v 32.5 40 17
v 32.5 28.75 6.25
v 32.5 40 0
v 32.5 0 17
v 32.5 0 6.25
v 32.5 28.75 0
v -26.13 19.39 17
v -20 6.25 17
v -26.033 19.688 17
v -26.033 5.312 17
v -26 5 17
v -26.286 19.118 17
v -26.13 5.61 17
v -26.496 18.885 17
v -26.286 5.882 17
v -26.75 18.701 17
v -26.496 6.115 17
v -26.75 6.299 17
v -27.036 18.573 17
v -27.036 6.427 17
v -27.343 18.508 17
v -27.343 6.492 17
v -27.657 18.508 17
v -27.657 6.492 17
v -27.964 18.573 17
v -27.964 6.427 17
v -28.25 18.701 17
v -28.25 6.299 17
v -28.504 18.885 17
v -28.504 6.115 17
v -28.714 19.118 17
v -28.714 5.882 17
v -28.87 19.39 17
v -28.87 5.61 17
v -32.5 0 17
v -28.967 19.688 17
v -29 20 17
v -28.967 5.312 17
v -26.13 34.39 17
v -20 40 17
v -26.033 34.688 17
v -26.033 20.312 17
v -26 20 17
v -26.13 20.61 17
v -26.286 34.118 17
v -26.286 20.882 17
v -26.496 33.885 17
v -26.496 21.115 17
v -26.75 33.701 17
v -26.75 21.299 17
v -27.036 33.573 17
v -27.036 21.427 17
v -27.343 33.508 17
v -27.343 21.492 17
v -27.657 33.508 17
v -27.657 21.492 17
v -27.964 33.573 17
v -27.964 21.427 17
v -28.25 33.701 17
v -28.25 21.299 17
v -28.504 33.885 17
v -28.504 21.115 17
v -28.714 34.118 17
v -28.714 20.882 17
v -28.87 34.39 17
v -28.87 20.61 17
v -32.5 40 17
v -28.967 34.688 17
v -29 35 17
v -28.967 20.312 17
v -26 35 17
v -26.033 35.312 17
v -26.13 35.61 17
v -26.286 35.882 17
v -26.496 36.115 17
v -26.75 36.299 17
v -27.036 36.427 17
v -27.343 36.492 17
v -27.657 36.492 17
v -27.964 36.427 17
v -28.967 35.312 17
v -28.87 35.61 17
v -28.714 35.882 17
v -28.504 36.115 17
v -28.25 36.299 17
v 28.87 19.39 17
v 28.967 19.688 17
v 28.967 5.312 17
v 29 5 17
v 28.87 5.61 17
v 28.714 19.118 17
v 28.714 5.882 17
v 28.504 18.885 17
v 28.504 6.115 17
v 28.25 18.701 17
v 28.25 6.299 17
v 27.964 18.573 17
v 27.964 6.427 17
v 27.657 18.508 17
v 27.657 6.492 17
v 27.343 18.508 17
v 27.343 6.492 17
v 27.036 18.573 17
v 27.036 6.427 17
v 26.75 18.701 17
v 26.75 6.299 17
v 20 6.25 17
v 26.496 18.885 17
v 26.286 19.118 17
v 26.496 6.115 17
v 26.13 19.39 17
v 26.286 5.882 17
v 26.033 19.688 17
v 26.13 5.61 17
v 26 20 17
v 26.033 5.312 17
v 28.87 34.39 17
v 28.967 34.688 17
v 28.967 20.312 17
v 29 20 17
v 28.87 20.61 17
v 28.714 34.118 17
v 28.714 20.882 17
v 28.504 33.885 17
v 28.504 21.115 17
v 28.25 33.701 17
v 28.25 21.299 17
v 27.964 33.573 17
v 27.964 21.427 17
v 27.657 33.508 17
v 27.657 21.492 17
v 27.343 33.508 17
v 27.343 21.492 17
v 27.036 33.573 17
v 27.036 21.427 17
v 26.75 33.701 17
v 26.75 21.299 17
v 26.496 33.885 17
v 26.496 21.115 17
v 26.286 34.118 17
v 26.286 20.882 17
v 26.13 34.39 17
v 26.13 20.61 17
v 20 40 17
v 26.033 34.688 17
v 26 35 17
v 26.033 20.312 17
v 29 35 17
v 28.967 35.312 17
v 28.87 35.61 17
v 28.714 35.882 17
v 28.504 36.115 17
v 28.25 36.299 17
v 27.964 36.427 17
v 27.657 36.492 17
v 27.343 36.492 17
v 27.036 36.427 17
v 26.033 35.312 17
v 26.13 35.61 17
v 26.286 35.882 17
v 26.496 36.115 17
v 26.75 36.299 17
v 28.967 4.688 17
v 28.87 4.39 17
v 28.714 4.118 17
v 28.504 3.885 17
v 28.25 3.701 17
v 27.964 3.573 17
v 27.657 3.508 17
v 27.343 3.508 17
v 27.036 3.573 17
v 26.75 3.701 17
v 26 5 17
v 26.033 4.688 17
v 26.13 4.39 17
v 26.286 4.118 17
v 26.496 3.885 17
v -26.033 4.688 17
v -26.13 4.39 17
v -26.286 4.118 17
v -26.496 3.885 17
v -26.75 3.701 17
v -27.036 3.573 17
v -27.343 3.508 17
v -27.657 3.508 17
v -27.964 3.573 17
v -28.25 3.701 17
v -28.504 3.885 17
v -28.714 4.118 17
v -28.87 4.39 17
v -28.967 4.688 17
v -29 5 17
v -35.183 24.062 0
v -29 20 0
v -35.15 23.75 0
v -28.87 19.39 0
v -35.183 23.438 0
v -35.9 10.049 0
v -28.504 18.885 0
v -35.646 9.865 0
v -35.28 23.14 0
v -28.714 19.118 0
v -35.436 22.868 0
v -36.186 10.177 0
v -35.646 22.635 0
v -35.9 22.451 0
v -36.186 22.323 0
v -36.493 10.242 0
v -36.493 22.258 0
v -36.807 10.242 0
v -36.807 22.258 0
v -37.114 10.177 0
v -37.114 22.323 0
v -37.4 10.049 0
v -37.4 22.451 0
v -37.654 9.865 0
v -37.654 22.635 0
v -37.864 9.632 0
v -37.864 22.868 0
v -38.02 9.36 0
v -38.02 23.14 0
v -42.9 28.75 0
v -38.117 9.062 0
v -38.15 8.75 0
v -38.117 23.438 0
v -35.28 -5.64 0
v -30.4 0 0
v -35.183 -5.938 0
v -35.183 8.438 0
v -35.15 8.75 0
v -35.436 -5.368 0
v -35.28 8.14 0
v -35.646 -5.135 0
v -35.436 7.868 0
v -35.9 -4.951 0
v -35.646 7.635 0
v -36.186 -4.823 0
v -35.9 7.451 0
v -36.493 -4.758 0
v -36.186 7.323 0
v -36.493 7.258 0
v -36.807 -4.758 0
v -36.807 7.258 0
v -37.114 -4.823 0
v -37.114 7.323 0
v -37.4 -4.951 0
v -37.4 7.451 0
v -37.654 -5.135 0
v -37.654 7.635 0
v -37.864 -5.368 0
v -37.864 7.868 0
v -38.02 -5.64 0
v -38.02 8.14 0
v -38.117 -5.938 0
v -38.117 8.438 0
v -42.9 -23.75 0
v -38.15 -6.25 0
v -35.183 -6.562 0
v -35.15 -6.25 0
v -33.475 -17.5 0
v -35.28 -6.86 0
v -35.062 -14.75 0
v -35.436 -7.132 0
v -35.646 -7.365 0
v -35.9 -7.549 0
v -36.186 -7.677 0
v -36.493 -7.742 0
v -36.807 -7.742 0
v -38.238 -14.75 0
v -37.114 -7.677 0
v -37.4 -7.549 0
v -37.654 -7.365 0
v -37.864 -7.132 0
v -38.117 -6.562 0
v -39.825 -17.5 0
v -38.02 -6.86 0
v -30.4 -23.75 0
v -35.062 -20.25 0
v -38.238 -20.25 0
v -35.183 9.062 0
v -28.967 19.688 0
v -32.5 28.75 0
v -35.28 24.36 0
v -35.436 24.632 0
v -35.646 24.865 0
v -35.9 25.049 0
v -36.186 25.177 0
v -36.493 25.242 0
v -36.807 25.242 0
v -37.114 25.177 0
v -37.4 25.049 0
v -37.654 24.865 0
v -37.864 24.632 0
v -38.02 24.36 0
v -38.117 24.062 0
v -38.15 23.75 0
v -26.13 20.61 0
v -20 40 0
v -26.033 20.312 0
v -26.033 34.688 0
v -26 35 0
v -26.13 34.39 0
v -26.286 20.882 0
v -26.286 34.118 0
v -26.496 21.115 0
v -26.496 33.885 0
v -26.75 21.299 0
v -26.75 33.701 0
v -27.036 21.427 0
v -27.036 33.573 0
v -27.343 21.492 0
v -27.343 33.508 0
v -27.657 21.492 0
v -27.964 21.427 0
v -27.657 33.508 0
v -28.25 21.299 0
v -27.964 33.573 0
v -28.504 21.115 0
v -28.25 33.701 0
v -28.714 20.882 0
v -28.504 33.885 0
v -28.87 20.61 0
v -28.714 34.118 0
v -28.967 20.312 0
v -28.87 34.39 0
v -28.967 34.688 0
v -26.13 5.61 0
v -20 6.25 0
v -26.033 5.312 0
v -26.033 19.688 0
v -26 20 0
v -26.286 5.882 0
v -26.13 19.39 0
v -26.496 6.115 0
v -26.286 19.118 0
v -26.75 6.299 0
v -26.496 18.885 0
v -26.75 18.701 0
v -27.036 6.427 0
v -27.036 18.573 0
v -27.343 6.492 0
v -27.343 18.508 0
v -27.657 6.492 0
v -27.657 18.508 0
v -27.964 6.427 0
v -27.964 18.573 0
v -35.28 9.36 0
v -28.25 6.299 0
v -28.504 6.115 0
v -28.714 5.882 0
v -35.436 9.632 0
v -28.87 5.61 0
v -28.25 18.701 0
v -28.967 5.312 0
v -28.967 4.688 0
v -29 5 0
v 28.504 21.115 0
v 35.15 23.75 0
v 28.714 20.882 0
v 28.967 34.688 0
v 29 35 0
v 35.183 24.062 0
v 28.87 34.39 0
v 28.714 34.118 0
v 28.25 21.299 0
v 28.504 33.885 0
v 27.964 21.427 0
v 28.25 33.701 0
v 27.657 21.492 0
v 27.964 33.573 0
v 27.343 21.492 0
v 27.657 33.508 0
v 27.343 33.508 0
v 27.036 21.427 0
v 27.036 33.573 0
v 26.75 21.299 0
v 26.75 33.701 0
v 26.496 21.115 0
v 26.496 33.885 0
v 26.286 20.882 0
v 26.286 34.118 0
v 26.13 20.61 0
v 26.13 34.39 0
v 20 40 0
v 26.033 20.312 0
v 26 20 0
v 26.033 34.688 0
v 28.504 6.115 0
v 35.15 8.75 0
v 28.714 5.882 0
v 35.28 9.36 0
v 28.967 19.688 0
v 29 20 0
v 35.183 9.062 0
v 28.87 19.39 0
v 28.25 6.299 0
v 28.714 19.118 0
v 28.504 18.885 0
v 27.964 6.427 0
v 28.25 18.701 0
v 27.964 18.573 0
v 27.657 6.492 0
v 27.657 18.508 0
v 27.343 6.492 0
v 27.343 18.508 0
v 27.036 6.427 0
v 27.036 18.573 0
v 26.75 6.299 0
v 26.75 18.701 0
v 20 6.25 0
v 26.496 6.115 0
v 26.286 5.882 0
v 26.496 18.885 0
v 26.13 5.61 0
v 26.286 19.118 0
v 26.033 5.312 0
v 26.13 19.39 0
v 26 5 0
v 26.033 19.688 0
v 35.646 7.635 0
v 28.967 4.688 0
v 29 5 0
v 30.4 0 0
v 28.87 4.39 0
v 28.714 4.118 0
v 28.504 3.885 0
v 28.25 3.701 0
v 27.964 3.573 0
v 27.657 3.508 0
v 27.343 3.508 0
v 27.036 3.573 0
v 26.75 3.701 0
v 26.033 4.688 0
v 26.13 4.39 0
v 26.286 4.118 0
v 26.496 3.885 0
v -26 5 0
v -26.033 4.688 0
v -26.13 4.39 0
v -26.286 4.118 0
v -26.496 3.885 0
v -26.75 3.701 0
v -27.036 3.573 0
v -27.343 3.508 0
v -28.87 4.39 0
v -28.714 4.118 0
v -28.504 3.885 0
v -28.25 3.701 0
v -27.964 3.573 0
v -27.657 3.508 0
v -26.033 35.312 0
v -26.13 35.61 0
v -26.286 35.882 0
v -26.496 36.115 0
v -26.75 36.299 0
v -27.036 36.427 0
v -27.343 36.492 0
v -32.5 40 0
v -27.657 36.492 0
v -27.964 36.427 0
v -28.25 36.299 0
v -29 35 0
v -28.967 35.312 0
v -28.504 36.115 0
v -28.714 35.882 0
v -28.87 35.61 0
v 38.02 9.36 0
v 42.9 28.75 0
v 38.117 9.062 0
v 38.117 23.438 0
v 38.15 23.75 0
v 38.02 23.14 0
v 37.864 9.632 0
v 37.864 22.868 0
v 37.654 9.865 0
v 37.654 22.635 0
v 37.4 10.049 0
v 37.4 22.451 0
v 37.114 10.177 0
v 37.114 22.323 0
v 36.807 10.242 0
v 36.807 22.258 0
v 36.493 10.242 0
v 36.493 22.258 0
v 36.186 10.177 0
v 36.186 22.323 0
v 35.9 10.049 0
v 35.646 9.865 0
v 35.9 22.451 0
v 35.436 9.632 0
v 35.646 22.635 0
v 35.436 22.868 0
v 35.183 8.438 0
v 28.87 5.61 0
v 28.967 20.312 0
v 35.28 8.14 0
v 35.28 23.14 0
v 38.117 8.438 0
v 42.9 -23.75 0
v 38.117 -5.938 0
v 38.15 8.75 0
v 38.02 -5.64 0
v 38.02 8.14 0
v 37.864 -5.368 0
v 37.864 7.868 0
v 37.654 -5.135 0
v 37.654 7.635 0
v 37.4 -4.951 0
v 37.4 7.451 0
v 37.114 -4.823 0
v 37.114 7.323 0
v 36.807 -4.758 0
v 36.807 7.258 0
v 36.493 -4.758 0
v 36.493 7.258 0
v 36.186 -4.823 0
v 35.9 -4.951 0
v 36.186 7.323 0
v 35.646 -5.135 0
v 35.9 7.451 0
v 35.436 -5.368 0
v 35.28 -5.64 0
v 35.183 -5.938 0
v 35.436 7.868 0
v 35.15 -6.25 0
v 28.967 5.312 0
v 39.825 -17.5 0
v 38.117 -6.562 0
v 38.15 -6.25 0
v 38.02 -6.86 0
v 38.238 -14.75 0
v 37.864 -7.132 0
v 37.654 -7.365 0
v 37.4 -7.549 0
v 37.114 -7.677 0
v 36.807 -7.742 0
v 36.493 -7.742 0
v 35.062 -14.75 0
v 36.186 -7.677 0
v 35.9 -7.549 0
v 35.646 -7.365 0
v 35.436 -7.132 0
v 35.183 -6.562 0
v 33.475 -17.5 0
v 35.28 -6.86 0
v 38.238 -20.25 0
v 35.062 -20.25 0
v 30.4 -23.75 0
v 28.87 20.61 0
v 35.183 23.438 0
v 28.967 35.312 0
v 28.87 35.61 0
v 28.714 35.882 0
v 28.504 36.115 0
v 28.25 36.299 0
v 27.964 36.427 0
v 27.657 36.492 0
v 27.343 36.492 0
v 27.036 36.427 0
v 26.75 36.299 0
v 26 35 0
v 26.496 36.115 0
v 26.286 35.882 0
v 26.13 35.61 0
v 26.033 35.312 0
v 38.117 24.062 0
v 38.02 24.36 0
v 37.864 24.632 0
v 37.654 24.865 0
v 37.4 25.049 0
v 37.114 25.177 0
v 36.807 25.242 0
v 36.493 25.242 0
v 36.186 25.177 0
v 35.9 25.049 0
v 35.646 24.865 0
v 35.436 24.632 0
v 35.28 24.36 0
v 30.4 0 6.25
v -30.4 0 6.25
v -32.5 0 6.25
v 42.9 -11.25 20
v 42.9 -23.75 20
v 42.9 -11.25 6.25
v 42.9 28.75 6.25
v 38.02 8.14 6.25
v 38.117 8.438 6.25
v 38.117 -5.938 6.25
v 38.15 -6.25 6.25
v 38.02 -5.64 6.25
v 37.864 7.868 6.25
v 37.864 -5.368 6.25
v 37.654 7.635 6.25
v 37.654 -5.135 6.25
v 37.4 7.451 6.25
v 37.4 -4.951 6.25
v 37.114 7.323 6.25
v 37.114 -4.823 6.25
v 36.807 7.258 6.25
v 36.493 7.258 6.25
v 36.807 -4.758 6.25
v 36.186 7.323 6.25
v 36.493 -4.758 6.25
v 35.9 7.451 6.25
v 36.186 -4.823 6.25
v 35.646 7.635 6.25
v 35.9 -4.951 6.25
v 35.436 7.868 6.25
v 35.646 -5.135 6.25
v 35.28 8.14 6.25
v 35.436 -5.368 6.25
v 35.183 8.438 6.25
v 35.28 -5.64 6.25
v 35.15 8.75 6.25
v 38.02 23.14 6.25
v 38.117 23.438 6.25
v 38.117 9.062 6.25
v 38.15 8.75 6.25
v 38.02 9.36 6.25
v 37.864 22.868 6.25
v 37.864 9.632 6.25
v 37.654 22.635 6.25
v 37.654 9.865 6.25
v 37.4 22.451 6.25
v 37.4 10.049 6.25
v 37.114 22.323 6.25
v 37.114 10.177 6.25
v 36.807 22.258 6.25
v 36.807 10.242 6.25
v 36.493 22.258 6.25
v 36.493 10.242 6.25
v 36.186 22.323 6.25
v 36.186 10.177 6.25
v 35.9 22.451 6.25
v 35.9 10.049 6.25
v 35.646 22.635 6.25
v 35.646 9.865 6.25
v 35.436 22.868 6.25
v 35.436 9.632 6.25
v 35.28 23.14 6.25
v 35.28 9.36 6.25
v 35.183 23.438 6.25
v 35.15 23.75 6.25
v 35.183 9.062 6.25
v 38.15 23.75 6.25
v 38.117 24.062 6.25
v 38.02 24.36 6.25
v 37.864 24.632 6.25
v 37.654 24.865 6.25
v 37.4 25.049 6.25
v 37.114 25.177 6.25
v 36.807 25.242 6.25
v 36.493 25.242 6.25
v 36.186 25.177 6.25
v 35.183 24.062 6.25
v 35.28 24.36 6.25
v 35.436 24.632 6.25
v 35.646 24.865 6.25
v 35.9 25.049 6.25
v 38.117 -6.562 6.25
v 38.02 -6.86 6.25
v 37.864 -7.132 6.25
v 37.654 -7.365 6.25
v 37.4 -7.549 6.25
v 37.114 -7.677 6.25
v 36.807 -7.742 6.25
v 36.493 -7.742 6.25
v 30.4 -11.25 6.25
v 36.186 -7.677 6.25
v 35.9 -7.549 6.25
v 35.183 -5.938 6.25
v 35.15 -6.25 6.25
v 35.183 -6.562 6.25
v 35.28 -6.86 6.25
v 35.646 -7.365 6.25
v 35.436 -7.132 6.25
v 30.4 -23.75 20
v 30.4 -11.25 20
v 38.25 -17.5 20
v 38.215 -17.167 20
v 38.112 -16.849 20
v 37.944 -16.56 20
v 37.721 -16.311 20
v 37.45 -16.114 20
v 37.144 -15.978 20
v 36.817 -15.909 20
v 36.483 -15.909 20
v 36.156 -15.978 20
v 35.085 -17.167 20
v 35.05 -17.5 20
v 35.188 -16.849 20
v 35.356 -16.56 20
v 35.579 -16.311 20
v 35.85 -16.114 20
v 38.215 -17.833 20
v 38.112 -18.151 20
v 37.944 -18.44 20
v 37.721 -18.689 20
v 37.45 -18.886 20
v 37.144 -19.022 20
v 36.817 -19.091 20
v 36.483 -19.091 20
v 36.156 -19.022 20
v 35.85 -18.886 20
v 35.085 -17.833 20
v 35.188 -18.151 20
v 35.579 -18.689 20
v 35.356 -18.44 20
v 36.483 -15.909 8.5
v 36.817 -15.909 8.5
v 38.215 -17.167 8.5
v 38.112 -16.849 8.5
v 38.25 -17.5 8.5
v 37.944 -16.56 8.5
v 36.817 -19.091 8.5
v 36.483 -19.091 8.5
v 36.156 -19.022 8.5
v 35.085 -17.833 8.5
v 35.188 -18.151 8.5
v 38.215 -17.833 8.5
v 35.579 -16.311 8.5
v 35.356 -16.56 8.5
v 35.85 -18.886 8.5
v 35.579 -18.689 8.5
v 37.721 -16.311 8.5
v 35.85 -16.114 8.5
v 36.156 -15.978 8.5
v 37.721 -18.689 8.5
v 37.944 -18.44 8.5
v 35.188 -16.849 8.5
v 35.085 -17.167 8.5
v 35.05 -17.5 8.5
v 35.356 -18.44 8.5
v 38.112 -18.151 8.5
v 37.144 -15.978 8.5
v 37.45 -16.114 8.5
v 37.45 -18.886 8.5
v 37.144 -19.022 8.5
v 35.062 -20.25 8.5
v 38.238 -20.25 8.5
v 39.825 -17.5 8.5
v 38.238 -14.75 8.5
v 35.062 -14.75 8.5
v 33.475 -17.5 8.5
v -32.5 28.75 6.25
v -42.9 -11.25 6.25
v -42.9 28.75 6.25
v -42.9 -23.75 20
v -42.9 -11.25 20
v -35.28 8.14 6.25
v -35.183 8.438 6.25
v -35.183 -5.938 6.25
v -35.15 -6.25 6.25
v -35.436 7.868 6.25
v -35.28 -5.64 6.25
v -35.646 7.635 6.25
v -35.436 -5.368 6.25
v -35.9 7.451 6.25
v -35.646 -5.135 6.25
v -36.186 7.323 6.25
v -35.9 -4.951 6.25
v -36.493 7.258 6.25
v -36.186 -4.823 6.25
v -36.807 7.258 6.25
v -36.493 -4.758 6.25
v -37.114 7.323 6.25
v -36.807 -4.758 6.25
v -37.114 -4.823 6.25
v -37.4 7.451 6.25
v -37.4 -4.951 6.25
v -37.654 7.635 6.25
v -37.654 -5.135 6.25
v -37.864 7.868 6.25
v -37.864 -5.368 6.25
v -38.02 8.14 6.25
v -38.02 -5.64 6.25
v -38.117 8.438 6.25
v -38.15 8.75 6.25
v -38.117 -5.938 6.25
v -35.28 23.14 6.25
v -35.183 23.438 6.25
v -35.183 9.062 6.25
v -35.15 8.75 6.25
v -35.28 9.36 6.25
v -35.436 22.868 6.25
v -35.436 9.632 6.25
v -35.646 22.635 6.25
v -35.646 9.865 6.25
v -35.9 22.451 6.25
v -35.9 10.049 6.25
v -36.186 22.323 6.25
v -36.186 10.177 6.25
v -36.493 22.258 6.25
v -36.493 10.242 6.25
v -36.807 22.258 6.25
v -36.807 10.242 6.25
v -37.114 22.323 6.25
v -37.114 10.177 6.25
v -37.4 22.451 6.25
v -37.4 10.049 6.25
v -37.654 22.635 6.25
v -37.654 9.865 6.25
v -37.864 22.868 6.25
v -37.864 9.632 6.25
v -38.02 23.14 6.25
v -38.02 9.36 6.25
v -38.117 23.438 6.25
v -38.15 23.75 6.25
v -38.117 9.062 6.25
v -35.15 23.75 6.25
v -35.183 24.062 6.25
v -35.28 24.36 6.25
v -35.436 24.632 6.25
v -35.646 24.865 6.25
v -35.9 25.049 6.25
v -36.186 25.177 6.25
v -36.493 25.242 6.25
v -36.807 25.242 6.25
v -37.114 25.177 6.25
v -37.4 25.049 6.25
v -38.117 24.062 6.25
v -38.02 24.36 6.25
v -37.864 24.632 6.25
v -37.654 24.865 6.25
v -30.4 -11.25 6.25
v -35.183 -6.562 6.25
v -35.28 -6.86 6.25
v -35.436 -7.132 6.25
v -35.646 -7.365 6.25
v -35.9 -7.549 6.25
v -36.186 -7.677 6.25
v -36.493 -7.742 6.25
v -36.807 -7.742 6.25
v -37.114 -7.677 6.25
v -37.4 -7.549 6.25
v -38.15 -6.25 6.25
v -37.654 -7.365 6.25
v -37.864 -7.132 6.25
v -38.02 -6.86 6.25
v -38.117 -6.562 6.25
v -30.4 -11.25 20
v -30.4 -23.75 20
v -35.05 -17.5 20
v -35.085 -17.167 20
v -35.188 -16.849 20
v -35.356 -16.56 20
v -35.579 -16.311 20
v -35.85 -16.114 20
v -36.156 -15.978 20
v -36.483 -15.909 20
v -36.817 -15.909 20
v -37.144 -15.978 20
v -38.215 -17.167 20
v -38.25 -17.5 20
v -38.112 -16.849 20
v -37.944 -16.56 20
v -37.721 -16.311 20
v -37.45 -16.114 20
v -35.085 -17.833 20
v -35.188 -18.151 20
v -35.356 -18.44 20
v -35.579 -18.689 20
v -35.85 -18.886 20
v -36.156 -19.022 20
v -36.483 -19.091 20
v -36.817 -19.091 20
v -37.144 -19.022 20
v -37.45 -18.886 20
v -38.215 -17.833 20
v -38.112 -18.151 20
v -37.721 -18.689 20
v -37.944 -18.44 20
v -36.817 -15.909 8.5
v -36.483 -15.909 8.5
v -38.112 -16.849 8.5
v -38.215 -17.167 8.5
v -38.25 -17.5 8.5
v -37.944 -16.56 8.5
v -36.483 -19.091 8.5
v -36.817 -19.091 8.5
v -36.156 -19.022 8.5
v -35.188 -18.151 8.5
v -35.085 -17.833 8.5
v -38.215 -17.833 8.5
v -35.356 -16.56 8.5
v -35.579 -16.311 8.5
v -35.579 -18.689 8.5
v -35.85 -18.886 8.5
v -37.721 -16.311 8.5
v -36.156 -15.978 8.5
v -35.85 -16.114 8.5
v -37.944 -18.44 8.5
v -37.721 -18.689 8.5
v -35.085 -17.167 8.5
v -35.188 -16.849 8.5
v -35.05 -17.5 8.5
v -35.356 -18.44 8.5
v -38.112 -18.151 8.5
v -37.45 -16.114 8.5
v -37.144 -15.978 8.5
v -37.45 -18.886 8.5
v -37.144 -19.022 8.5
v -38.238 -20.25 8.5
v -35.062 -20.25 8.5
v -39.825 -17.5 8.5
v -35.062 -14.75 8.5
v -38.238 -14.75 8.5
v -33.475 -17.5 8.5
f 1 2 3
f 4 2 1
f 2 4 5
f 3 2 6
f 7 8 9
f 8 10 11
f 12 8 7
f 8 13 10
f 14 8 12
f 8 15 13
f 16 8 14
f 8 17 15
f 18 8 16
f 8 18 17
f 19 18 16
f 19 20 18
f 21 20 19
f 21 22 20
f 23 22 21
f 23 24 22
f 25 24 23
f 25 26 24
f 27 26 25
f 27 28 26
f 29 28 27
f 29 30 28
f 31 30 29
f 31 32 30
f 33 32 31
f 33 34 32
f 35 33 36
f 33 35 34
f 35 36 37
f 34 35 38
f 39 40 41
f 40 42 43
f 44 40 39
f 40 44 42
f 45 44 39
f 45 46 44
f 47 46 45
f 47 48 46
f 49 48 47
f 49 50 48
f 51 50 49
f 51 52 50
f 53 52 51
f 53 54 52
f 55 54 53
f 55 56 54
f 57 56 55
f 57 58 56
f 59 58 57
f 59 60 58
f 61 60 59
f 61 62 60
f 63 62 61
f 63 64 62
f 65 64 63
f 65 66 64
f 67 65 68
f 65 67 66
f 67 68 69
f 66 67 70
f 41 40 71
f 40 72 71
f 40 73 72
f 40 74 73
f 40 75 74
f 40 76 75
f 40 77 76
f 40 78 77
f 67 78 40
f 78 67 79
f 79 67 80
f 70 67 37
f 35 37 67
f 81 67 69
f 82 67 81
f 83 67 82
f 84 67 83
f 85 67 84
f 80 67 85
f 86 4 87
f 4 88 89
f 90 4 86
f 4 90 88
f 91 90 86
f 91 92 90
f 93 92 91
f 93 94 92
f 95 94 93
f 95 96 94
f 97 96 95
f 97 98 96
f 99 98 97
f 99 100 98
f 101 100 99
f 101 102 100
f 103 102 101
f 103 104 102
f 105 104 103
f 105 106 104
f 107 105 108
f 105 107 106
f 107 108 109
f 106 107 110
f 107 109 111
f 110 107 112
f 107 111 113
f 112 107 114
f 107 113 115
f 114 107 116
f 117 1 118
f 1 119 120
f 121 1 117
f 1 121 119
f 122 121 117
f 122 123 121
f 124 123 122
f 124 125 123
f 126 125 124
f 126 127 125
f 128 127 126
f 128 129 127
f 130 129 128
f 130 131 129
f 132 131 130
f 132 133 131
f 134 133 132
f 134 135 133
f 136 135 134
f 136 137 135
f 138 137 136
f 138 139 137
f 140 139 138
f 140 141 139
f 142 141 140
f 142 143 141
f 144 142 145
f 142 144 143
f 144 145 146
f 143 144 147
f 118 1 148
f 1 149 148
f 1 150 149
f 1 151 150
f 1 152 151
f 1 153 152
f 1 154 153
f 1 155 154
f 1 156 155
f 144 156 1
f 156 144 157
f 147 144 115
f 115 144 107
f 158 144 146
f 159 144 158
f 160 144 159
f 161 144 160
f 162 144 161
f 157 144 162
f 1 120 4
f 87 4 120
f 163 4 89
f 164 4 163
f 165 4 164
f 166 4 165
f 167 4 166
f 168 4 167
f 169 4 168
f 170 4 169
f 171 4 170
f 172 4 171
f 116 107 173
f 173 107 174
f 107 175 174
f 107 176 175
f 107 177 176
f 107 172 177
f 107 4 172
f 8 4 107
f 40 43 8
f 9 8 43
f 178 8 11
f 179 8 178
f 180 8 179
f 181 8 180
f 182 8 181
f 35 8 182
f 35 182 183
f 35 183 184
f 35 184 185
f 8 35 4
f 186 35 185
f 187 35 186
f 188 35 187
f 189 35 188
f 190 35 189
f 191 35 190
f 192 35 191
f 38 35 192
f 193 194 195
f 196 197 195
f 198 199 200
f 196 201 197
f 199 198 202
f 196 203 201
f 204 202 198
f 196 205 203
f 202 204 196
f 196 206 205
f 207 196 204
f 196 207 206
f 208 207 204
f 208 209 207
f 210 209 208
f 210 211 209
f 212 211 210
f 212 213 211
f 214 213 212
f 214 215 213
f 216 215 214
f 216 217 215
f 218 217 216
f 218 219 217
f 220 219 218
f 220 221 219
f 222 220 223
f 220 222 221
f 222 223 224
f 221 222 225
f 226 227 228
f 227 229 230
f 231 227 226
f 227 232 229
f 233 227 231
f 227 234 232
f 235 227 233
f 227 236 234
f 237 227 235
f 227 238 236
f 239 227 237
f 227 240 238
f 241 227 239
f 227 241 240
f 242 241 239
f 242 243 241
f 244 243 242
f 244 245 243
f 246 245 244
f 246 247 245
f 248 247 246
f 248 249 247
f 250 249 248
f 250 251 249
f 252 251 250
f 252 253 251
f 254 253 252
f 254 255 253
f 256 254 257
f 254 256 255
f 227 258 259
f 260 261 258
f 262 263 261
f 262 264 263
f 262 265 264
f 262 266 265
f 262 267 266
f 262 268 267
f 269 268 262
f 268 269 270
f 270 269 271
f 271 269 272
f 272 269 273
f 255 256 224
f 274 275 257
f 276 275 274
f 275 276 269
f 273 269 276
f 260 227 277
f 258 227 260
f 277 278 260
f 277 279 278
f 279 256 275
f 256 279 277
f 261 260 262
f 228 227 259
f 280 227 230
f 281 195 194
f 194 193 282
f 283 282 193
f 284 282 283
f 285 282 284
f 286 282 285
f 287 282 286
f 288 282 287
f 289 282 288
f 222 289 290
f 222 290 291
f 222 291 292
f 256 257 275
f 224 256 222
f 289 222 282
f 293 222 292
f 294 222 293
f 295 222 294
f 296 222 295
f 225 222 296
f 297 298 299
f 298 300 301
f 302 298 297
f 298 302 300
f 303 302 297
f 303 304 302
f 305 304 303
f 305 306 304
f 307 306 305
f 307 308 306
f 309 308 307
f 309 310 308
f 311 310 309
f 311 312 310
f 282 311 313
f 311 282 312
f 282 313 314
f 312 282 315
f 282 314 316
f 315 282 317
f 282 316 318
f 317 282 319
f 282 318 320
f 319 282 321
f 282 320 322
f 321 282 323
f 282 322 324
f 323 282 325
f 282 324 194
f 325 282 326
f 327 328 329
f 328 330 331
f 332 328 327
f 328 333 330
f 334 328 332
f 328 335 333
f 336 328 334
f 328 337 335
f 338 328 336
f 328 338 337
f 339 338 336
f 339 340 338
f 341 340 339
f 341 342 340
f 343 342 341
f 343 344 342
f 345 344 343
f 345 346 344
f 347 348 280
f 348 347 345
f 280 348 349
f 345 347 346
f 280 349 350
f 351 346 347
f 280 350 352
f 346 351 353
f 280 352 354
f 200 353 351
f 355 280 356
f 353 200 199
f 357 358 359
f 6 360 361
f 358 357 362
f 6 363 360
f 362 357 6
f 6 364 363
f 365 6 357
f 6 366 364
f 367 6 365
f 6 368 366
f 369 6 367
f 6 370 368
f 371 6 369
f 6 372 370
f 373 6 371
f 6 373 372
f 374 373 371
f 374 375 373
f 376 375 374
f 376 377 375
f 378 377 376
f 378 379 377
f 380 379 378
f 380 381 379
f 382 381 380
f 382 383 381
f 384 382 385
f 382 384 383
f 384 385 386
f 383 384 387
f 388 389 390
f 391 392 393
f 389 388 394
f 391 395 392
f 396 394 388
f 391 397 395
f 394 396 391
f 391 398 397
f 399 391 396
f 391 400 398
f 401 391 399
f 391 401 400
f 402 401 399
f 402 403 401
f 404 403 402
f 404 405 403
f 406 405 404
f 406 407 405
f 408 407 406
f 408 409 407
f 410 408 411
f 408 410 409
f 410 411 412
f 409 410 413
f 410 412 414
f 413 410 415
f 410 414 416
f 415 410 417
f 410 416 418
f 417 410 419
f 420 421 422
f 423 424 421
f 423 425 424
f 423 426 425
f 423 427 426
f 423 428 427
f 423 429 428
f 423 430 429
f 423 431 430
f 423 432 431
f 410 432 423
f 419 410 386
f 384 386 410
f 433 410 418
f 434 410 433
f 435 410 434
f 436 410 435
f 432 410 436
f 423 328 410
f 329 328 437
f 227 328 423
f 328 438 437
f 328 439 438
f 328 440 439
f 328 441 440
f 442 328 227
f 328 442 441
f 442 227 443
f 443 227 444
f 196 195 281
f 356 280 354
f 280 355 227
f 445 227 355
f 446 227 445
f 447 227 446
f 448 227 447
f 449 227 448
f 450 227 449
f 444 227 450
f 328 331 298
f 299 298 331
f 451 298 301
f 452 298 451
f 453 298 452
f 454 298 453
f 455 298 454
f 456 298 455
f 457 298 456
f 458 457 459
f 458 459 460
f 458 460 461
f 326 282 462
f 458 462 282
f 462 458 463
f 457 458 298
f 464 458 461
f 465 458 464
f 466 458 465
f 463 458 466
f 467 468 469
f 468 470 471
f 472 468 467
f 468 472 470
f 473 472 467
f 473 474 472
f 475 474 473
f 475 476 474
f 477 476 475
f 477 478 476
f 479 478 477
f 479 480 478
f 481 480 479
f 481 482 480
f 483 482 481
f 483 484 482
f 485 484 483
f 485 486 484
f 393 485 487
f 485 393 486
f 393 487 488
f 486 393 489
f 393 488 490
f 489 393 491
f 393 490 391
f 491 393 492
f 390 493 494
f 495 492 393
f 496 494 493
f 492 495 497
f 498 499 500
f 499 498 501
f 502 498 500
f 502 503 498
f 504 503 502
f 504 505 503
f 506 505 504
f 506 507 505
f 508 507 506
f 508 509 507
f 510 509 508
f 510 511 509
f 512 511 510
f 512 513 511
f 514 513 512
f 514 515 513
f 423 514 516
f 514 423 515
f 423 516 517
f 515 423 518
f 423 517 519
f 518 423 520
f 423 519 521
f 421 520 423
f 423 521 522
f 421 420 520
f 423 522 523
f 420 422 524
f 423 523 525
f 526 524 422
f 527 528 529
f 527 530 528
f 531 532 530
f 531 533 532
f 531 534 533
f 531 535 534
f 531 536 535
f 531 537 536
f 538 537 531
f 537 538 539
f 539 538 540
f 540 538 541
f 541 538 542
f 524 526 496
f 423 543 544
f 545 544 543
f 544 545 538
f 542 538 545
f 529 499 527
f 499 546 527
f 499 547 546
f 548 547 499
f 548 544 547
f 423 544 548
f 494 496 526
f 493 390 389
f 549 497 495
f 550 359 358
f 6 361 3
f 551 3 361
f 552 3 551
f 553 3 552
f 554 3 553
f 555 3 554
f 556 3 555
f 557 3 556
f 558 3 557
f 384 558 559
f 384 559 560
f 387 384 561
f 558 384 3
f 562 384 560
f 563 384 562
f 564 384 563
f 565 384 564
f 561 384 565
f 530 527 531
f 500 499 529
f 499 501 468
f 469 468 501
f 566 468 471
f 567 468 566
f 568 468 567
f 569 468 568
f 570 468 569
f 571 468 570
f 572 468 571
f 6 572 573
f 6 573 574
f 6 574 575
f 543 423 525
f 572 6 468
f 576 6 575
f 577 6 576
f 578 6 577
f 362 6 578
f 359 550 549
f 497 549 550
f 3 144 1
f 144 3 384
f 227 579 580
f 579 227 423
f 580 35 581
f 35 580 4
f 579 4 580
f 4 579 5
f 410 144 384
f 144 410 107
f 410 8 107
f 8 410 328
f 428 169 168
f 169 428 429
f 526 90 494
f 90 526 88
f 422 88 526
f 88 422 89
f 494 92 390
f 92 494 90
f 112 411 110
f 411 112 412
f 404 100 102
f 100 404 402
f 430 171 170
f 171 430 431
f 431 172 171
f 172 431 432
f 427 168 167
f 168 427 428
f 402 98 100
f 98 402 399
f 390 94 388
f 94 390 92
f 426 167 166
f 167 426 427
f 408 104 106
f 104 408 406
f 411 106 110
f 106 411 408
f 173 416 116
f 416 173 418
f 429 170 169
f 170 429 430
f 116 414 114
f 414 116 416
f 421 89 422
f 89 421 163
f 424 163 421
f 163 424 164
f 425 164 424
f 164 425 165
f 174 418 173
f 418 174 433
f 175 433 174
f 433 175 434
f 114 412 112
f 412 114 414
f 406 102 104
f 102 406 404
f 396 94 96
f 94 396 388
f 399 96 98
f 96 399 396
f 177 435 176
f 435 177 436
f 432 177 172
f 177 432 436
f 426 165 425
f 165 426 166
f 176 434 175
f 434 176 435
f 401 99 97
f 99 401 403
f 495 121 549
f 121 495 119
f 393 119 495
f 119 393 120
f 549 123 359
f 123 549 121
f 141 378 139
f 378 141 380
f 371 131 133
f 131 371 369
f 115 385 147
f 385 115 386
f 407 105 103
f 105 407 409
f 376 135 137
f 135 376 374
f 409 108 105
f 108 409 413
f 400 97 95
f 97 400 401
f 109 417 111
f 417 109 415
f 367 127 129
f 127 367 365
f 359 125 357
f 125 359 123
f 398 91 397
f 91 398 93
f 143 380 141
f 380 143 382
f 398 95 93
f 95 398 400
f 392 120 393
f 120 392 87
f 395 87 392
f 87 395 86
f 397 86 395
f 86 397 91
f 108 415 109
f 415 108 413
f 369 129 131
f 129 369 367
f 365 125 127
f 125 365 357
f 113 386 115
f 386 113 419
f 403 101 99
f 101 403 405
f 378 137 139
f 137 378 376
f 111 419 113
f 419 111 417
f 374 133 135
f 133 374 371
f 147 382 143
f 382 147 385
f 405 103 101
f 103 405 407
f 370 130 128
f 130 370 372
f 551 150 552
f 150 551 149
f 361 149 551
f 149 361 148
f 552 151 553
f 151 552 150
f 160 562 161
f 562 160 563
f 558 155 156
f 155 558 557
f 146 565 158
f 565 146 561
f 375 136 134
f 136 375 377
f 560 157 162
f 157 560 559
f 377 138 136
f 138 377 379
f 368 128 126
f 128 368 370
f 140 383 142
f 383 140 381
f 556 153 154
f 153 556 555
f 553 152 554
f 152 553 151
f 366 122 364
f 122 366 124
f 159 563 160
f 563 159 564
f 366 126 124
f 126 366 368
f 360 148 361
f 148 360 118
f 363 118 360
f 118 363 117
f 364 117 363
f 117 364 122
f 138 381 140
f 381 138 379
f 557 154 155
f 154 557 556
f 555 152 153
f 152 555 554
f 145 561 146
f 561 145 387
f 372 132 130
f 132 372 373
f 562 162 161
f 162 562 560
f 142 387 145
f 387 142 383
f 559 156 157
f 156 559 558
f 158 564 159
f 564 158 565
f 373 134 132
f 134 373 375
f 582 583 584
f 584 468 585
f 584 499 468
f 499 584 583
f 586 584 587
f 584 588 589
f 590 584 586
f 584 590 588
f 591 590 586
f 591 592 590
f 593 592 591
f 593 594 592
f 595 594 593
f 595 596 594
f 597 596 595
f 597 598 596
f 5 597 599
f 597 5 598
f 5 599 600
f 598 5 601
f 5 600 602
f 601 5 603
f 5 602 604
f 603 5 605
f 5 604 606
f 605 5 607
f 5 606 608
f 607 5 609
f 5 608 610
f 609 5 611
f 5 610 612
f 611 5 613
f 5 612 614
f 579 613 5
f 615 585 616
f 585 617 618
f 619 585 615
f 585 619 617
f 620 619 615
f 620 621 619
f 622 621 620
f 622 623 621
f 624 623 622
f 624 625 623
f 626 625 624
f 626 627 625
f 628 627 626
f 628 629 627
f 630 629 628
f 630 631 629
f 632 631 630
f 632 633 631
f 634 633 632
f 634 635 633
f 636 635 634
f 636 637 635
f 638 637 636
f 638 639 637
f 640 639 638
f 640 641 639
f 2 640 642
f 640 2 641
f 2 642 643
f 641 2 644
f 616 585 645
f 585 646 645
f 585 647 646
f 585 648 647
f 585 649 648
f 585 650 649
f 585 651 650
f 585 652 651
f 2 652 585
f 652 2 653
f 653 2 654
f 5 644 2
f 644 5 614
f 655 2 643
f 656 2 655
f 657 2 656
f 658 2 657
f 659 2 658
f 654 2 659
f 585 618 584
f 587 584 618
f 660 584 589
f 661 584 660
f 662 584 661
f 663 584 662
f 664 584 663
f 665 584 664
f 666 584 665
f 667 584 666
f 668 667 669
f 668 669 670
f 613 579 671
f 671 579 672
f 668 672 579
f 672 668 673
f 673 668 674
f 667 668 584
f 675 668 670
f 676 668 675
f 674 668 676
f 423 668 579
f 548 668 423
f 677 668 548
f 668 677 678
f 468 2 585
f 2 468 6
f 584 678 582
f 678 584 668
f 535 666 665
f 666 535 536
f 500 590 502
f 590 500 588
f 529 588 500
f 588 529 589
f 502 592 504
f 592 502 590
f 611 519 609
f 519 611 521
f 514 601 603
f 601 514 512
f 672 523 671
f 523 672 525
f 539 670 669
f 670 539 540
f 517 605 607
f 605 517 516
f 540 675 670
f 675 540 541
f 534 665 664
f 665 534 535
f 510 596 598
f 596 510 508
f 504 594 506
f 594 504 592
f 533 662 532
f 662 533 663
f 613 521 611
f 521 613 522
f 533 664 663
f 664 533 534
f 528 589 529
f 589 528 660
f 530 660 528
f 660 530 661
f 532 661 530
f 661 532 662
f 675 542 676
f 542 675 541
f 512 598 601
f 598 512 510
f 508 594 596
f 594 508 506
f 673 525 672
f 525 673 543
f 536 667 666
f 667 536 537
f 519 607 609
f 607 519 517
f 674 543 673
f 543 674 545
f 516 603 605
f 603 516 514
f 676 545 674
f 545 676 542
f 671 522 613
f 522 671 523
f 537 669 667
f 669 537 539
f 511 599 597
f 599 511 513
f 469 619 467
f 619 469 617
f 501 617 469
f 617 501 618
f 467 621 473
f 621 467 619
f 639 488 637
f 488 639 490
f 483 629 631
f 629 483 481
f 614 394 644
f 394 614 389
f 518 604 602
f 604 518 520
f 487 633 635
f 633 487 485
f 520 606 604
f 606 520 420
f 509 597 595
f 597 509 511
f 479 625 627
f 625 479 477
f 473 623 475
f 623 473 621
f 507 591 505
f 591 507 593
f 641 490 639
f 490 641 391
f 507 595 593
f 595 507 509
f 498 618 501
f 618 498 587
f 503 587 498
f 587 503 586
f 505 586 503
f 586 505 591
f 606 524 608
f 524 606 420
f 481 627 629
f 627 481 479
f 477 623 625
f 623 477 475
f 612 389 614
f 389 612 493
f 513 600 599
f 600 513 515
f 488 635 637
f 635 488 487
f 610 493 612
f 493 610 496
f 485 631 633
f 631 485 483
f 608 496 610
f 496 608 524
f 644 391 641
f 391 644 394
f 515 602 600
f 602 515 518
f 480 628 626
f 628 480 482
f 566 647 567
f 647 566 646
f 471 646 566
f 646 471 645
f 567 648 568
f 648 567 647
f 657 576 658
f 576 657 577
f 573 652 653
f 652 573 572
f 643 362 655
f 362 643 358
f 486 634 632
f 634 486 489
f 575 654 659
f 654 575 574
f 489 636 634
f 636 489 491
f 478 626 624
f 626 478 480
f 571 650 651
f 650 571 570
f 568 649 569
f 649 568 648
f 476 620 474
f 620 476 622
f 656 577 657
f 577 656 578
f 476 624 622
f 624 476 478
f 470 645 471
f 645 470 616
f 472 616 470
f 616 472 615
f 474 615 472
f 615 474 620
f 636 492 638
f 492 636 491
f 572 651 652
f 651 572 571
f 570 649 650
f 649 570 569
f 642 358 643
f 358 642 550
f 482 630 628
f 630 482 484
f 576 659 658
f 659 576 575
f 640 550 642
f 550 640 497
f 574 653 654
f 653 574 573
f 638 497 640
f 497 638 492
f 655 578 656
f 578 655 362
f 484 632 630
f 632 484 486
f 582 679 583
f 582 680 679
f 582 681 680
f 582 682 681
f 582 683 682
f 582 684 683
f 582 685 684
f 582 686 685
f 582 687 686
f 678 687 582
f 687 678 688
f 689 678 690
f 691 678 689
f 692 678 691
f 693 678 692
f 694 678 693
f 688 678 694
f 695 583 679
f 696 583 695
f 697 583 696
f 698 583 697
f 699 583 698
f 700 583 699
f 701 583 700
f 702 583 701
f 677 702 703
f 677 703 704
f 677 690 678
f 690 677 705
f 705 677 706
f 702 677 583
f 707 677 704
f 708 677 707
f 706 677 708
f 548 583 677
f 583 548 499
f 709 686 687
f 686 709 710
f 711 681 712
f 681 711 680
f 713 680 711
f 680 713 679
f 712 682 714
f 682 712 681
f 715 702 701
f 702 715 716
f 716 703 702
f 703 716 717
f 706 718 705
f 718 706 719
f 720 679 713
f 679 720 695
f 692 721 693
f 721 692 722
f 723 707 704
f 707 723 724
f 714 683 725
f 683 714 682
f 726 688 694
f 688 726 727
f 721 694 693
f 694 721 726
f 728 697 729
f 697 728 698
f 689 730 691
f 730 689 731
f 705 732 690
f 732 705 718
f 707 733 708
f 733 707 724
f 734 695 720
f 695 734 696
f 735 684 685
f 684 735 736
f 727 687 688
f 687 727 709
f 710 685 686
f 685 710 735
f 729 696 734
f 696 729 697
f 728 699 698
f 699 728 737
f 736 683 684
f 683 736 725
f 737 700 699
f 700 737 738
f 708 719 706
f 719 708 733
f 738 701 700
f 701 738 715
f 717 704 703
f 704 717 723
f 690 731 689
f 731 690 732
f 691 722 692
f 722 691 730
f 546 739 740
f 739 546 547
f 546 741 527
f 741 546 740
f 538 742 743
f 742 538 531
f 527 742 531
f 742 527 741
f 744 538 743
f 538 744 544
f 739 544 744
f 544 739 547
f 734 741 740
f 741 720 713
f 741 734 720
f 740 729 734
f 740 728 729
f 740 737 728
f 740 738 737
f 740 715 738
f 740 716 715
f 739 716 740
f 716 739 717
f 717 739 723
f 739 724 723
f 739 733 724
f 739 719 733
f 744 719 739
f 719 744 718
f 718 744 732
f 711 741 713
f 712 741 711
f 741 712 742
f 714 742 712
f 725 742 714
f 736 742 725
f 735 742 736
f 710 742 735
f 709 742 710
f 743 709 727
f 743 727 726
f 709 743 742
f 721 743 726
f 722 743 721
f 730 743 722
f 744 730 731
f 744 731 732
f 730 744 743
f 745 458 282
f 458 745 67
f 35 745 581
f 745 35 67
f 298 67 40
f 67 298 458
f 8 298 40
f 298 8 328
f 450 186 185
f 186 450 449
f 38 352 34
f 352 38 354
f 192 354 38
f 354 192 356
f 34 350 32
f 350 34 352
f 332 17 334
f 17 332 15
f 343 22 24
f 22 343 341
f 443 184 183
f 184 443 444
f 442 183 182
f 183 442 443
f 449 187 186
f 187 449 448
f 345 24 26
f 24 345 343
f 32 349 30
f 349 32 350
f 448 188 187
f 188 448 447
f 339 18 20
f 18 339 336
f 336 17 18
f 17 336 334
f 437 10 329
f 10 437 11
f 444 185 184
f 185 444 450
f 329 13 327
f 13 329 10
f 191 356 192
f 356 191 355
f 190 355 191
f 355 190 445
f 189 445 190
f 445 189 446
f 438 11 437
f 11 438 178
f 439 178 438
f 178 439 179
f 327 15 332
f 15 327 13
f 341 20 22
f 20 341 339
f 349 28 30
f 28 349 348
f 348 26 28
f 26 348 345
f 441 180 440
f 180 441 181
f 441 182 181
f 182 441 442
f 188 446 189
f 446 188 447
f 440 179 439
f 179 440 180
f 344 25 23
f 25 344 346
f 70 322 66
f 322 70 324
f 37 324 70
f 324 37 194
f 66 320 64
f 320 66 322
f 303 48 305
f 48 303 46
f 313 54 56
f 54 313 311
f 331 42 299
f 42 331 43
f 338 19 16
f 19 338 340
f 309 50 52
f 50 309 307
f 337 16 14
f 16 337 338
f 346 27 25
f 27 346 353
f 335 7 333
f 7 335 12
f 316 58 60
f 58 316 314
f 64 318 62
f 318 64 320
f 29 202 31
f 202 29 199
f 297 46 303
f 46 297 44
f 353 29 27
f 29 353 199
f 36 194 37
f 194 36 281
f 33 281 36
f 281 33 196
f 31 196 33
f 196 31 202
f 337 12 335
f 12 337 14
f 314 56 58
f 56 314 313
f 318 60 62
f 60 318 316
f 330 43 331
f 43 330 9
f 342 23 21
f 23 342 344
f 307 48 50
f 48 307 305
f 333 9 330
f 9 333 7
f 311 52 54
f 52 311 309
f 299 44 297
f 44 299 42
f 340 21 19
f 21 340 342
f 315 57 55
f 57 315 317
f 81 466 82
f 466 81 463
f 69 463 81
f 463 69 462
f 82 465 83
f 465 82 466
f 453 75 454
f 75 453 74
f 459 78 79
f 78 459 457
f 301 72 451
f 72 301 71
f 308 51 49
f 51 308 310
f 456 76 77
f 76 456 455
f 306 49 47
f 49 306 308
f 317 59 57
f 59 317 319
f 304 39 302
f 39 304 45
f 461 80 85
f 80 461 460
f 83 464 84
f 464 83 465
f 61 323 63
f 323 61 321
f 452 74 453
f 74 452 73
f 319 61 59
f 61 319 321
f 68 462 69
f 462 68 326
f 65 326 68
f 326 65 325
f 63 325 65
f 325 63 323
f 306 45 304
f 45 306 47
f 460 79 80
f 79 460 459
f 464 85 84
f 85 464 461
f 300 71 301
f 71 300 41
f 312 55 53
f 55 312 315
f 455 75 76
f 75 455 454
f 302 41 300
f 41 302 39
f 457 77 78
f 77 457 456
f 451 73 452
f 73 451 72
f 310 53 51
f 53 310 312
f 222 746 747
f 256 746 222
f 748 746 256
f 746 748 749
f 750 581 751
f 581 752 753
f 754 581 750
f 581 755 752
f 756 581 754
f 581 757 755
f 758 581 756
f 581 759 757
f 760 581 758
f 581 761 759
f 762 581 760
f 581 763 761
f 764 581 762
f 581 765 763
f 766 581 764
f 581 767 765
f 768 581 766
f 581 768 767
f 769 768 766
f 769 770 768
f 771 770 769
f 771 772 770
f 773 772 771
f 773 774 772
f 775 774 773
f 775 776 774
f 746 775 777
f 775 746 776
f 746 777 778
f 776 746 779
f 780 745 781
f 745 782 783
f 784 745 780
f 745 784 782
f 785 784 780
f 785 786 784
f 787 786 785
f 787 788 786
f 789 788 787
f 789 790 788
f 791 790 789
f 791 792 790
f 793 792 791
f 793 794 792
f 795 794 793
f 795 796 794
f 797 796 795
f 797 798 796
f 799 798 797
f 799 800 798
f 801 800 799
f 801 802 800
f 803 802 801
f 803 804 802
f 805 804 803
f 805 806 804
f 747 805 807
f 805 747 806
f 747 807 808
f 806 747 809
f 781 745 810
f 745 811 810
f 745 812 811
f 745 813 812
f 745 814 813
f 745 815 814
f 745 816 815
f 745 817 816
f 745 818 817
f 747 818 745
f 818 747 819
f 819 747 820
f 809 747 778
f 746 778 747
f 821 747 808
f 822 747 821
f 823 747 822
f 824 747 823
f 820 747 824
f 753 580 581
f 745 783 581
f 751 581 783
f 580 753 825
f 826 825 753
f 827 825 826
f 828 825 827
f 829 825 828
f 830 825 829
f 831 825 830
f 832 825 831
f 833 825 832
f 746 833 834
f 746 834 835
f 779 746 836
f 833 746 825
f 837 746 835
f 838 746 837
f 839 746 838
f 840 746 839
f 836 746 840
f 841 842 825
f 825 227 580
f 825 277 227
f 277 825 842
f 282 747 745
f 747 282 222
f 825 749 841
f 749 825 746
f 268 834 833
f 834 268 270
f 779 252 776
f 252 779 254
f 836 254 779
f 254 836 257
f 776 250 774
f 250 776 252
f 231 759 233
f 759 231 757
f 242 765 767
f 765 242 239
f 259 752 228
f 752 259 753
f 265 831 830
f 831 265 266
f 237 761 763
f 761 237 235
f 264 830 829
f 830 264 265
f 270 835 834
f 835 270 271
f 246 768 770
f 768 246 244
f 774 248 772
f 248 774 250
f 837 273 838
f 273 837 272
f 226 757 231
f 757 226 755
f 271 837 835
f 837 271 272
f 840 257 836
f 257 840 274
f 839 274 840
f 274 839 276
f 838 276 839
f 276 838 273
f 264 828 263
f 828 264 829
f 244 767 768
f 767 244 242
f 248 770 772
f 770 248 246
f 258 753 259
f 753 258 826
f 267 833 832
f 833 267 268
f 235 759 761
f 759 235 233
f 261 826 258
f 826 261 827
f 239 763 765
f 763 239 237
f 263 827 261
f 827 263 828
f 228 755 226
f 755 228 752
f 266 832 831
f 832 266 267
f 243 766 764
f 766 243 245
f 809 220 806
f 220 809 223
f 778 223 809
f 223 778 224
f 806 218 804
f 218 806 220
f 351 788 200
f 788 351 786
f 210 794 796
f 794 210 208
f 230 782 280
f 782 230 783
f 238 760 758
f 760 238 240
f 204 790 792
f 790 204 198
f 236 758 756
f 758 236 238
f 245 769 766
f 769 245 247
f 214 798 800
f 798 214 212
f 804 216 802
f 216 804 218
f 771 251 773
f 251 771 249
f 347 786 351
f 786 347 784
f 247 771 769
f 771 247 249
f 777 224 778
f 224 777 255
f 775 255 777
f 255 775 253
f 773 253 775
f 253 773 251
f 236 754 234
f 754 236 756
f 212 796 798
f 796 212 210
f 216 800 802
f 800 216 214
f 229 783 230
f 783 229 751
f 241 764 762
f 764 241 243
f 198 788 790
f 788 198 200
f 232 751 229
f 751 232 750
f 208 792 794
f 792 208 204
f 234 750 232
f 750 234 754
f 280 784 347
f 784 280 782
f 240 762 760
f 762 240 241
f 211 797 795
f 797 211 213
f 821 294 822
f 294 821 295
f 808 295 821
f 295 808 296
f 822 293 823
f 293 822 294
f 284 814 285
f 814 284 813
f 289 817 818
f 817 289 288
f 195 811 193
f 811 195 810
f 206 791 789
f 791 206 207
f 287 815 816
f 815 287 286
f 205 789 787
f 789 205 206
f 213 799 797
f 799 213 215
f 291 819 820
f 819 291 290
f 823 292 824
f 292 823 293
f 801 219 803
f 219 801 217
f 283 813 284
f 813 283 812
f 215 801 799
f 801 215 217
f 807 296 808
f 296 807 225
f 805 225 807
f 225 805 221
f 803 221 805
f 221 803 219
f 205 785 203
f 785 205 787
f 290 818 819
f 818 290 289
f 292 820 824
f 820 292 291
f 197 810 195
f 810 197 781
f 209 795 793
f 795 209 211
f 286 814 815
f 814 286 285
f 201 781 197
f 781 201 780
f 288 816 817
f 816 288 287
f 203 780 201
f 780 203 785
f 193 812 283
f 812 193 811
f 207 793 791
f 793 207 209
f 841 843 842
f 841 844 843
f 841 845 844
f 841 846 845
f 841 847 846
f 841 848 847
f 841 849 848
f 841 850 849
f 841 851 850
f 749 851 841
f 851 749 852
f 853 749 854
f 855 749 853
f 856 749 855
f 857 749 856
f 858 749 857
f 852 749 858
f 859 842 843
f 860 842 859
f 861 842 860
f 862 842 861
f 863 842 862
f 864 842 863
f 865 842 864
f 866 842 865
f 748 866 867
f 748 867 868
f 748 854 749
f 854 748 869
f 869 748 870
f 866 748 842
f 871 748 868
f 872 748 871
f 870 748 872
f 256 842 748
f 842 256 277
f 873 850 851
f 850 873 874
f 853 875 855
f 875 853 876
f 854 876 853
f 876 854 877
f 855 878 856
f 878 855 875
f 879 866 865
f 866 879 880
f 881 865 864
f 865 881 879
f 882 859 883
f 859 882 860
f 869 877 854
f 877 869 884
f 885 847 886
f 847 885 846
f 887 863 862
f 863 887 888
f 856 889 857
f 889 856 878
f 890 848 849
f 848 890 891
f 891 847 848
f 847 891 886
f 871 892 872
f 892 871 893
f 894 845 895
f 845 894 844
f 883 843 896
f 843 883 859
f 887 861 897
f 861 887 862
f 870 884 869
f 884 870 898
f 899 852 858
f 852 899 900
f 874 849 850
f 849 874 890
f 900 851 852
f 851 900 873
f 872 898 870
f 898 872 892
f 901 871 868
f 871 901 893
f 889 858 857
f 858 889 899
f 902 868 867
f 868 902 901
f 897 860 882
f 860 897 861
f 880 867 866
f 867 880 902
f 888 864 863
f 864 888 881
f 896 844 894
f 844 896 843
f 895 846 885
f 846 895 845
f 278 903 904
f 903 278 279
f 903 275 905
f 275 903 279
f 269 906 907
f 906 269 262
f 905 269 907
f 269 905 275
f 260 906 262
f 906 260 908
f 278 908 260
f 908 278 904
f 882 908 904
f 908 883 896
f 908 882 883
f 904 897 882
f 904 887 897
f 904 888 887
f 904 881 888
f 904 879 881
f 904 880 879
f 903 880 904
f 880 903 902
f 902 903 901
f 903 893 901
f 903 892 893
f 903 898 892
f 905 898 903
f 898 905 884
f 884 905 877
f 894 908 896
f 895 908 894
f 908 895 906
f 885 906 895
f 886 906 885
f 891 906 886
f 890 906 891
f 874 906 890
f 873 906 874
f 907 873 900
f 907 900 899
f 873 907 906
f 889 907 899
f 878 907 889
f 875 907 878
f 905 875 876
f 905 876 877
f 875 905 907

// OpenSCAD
//OpenSCAD version 2021.01
//Bracket for mounting a single BMG extruder to Makerbot Dual Extruder carriage
//Simon Pilepich 2021-09-16



h=17; //Height to raise the bracket by

mount_hole_spacing=73.3;
mount_hole_diameter=3;
mount_hole_nut=5.5;
w=12.5; // width of attachment square
carriage_width = 130; // Overall carrier width
mount_hole_nut_radius=mount_hole_nut/2/sin(30)/sin(60); //Calculate diameter for nut
y_offset = 21.5-4; // Back spacing




one_side();
mirror([1,0,0]) one_side();

module one_side() {
    //NEMA bracket riser
    nbr=[carriage_width/2,40,h];
    difference() {
        //NEMA base block
        cube([nbr[0]/2,nbr[1],nbr[2]]);
        translate([0,w/2,0]) {
            //space saving hole
            cube([nbr[0]/2-w,nbr[1],nbr[2]]);
        }
        //NEMA bracker mount screw 
        translate([nbr[0]/2-5,5,0]) cylinder(d=3,h=h,$fn=30);
        translate([nbr[0]/2-5,nbr[1]/2,0]) cylinder(d=3,h=h,$fn=30);
        translate([nbr[0]/2-5,nbr[1]-5,0]) cylinder(d=3,h=h,$fn=30);

    }
    //Connecting brace
    translate([mount_hole_spacing/2-w/2,+w/2-y_offset,0]) {
        difference() {
            cube([w,nbr[1],w/2]);
            //Connecting brace holes
            translate([+w/2,5,0]) cylinder(d=3,h=h,$fn=30);
            translate([+w/2,nbr[1]/2,0]) cylinder(d=3,h=h,$fn=30);
            translate([+w/2,nbr[1]-5,0]) cylinder(d=3,h=h,$fn=30);
        }
    }
    //mount post
    translate([mount_hole_spacing/2-w/2,-w/2-y_offset,]) {
        difference() {
            cube([w,w,h+3]);
            //Through hole
            translate([w/2,w/2,0]) cylinder(d=3.2,h=h+3,$fn=30);
            // Nut hex (d=6.25 for 5.5mm nut)
            translate([w/2,w/2,0]) cylinder(d=mount_hole_nut_radius,h=h/2,$fn=6);
        }
    }
}
